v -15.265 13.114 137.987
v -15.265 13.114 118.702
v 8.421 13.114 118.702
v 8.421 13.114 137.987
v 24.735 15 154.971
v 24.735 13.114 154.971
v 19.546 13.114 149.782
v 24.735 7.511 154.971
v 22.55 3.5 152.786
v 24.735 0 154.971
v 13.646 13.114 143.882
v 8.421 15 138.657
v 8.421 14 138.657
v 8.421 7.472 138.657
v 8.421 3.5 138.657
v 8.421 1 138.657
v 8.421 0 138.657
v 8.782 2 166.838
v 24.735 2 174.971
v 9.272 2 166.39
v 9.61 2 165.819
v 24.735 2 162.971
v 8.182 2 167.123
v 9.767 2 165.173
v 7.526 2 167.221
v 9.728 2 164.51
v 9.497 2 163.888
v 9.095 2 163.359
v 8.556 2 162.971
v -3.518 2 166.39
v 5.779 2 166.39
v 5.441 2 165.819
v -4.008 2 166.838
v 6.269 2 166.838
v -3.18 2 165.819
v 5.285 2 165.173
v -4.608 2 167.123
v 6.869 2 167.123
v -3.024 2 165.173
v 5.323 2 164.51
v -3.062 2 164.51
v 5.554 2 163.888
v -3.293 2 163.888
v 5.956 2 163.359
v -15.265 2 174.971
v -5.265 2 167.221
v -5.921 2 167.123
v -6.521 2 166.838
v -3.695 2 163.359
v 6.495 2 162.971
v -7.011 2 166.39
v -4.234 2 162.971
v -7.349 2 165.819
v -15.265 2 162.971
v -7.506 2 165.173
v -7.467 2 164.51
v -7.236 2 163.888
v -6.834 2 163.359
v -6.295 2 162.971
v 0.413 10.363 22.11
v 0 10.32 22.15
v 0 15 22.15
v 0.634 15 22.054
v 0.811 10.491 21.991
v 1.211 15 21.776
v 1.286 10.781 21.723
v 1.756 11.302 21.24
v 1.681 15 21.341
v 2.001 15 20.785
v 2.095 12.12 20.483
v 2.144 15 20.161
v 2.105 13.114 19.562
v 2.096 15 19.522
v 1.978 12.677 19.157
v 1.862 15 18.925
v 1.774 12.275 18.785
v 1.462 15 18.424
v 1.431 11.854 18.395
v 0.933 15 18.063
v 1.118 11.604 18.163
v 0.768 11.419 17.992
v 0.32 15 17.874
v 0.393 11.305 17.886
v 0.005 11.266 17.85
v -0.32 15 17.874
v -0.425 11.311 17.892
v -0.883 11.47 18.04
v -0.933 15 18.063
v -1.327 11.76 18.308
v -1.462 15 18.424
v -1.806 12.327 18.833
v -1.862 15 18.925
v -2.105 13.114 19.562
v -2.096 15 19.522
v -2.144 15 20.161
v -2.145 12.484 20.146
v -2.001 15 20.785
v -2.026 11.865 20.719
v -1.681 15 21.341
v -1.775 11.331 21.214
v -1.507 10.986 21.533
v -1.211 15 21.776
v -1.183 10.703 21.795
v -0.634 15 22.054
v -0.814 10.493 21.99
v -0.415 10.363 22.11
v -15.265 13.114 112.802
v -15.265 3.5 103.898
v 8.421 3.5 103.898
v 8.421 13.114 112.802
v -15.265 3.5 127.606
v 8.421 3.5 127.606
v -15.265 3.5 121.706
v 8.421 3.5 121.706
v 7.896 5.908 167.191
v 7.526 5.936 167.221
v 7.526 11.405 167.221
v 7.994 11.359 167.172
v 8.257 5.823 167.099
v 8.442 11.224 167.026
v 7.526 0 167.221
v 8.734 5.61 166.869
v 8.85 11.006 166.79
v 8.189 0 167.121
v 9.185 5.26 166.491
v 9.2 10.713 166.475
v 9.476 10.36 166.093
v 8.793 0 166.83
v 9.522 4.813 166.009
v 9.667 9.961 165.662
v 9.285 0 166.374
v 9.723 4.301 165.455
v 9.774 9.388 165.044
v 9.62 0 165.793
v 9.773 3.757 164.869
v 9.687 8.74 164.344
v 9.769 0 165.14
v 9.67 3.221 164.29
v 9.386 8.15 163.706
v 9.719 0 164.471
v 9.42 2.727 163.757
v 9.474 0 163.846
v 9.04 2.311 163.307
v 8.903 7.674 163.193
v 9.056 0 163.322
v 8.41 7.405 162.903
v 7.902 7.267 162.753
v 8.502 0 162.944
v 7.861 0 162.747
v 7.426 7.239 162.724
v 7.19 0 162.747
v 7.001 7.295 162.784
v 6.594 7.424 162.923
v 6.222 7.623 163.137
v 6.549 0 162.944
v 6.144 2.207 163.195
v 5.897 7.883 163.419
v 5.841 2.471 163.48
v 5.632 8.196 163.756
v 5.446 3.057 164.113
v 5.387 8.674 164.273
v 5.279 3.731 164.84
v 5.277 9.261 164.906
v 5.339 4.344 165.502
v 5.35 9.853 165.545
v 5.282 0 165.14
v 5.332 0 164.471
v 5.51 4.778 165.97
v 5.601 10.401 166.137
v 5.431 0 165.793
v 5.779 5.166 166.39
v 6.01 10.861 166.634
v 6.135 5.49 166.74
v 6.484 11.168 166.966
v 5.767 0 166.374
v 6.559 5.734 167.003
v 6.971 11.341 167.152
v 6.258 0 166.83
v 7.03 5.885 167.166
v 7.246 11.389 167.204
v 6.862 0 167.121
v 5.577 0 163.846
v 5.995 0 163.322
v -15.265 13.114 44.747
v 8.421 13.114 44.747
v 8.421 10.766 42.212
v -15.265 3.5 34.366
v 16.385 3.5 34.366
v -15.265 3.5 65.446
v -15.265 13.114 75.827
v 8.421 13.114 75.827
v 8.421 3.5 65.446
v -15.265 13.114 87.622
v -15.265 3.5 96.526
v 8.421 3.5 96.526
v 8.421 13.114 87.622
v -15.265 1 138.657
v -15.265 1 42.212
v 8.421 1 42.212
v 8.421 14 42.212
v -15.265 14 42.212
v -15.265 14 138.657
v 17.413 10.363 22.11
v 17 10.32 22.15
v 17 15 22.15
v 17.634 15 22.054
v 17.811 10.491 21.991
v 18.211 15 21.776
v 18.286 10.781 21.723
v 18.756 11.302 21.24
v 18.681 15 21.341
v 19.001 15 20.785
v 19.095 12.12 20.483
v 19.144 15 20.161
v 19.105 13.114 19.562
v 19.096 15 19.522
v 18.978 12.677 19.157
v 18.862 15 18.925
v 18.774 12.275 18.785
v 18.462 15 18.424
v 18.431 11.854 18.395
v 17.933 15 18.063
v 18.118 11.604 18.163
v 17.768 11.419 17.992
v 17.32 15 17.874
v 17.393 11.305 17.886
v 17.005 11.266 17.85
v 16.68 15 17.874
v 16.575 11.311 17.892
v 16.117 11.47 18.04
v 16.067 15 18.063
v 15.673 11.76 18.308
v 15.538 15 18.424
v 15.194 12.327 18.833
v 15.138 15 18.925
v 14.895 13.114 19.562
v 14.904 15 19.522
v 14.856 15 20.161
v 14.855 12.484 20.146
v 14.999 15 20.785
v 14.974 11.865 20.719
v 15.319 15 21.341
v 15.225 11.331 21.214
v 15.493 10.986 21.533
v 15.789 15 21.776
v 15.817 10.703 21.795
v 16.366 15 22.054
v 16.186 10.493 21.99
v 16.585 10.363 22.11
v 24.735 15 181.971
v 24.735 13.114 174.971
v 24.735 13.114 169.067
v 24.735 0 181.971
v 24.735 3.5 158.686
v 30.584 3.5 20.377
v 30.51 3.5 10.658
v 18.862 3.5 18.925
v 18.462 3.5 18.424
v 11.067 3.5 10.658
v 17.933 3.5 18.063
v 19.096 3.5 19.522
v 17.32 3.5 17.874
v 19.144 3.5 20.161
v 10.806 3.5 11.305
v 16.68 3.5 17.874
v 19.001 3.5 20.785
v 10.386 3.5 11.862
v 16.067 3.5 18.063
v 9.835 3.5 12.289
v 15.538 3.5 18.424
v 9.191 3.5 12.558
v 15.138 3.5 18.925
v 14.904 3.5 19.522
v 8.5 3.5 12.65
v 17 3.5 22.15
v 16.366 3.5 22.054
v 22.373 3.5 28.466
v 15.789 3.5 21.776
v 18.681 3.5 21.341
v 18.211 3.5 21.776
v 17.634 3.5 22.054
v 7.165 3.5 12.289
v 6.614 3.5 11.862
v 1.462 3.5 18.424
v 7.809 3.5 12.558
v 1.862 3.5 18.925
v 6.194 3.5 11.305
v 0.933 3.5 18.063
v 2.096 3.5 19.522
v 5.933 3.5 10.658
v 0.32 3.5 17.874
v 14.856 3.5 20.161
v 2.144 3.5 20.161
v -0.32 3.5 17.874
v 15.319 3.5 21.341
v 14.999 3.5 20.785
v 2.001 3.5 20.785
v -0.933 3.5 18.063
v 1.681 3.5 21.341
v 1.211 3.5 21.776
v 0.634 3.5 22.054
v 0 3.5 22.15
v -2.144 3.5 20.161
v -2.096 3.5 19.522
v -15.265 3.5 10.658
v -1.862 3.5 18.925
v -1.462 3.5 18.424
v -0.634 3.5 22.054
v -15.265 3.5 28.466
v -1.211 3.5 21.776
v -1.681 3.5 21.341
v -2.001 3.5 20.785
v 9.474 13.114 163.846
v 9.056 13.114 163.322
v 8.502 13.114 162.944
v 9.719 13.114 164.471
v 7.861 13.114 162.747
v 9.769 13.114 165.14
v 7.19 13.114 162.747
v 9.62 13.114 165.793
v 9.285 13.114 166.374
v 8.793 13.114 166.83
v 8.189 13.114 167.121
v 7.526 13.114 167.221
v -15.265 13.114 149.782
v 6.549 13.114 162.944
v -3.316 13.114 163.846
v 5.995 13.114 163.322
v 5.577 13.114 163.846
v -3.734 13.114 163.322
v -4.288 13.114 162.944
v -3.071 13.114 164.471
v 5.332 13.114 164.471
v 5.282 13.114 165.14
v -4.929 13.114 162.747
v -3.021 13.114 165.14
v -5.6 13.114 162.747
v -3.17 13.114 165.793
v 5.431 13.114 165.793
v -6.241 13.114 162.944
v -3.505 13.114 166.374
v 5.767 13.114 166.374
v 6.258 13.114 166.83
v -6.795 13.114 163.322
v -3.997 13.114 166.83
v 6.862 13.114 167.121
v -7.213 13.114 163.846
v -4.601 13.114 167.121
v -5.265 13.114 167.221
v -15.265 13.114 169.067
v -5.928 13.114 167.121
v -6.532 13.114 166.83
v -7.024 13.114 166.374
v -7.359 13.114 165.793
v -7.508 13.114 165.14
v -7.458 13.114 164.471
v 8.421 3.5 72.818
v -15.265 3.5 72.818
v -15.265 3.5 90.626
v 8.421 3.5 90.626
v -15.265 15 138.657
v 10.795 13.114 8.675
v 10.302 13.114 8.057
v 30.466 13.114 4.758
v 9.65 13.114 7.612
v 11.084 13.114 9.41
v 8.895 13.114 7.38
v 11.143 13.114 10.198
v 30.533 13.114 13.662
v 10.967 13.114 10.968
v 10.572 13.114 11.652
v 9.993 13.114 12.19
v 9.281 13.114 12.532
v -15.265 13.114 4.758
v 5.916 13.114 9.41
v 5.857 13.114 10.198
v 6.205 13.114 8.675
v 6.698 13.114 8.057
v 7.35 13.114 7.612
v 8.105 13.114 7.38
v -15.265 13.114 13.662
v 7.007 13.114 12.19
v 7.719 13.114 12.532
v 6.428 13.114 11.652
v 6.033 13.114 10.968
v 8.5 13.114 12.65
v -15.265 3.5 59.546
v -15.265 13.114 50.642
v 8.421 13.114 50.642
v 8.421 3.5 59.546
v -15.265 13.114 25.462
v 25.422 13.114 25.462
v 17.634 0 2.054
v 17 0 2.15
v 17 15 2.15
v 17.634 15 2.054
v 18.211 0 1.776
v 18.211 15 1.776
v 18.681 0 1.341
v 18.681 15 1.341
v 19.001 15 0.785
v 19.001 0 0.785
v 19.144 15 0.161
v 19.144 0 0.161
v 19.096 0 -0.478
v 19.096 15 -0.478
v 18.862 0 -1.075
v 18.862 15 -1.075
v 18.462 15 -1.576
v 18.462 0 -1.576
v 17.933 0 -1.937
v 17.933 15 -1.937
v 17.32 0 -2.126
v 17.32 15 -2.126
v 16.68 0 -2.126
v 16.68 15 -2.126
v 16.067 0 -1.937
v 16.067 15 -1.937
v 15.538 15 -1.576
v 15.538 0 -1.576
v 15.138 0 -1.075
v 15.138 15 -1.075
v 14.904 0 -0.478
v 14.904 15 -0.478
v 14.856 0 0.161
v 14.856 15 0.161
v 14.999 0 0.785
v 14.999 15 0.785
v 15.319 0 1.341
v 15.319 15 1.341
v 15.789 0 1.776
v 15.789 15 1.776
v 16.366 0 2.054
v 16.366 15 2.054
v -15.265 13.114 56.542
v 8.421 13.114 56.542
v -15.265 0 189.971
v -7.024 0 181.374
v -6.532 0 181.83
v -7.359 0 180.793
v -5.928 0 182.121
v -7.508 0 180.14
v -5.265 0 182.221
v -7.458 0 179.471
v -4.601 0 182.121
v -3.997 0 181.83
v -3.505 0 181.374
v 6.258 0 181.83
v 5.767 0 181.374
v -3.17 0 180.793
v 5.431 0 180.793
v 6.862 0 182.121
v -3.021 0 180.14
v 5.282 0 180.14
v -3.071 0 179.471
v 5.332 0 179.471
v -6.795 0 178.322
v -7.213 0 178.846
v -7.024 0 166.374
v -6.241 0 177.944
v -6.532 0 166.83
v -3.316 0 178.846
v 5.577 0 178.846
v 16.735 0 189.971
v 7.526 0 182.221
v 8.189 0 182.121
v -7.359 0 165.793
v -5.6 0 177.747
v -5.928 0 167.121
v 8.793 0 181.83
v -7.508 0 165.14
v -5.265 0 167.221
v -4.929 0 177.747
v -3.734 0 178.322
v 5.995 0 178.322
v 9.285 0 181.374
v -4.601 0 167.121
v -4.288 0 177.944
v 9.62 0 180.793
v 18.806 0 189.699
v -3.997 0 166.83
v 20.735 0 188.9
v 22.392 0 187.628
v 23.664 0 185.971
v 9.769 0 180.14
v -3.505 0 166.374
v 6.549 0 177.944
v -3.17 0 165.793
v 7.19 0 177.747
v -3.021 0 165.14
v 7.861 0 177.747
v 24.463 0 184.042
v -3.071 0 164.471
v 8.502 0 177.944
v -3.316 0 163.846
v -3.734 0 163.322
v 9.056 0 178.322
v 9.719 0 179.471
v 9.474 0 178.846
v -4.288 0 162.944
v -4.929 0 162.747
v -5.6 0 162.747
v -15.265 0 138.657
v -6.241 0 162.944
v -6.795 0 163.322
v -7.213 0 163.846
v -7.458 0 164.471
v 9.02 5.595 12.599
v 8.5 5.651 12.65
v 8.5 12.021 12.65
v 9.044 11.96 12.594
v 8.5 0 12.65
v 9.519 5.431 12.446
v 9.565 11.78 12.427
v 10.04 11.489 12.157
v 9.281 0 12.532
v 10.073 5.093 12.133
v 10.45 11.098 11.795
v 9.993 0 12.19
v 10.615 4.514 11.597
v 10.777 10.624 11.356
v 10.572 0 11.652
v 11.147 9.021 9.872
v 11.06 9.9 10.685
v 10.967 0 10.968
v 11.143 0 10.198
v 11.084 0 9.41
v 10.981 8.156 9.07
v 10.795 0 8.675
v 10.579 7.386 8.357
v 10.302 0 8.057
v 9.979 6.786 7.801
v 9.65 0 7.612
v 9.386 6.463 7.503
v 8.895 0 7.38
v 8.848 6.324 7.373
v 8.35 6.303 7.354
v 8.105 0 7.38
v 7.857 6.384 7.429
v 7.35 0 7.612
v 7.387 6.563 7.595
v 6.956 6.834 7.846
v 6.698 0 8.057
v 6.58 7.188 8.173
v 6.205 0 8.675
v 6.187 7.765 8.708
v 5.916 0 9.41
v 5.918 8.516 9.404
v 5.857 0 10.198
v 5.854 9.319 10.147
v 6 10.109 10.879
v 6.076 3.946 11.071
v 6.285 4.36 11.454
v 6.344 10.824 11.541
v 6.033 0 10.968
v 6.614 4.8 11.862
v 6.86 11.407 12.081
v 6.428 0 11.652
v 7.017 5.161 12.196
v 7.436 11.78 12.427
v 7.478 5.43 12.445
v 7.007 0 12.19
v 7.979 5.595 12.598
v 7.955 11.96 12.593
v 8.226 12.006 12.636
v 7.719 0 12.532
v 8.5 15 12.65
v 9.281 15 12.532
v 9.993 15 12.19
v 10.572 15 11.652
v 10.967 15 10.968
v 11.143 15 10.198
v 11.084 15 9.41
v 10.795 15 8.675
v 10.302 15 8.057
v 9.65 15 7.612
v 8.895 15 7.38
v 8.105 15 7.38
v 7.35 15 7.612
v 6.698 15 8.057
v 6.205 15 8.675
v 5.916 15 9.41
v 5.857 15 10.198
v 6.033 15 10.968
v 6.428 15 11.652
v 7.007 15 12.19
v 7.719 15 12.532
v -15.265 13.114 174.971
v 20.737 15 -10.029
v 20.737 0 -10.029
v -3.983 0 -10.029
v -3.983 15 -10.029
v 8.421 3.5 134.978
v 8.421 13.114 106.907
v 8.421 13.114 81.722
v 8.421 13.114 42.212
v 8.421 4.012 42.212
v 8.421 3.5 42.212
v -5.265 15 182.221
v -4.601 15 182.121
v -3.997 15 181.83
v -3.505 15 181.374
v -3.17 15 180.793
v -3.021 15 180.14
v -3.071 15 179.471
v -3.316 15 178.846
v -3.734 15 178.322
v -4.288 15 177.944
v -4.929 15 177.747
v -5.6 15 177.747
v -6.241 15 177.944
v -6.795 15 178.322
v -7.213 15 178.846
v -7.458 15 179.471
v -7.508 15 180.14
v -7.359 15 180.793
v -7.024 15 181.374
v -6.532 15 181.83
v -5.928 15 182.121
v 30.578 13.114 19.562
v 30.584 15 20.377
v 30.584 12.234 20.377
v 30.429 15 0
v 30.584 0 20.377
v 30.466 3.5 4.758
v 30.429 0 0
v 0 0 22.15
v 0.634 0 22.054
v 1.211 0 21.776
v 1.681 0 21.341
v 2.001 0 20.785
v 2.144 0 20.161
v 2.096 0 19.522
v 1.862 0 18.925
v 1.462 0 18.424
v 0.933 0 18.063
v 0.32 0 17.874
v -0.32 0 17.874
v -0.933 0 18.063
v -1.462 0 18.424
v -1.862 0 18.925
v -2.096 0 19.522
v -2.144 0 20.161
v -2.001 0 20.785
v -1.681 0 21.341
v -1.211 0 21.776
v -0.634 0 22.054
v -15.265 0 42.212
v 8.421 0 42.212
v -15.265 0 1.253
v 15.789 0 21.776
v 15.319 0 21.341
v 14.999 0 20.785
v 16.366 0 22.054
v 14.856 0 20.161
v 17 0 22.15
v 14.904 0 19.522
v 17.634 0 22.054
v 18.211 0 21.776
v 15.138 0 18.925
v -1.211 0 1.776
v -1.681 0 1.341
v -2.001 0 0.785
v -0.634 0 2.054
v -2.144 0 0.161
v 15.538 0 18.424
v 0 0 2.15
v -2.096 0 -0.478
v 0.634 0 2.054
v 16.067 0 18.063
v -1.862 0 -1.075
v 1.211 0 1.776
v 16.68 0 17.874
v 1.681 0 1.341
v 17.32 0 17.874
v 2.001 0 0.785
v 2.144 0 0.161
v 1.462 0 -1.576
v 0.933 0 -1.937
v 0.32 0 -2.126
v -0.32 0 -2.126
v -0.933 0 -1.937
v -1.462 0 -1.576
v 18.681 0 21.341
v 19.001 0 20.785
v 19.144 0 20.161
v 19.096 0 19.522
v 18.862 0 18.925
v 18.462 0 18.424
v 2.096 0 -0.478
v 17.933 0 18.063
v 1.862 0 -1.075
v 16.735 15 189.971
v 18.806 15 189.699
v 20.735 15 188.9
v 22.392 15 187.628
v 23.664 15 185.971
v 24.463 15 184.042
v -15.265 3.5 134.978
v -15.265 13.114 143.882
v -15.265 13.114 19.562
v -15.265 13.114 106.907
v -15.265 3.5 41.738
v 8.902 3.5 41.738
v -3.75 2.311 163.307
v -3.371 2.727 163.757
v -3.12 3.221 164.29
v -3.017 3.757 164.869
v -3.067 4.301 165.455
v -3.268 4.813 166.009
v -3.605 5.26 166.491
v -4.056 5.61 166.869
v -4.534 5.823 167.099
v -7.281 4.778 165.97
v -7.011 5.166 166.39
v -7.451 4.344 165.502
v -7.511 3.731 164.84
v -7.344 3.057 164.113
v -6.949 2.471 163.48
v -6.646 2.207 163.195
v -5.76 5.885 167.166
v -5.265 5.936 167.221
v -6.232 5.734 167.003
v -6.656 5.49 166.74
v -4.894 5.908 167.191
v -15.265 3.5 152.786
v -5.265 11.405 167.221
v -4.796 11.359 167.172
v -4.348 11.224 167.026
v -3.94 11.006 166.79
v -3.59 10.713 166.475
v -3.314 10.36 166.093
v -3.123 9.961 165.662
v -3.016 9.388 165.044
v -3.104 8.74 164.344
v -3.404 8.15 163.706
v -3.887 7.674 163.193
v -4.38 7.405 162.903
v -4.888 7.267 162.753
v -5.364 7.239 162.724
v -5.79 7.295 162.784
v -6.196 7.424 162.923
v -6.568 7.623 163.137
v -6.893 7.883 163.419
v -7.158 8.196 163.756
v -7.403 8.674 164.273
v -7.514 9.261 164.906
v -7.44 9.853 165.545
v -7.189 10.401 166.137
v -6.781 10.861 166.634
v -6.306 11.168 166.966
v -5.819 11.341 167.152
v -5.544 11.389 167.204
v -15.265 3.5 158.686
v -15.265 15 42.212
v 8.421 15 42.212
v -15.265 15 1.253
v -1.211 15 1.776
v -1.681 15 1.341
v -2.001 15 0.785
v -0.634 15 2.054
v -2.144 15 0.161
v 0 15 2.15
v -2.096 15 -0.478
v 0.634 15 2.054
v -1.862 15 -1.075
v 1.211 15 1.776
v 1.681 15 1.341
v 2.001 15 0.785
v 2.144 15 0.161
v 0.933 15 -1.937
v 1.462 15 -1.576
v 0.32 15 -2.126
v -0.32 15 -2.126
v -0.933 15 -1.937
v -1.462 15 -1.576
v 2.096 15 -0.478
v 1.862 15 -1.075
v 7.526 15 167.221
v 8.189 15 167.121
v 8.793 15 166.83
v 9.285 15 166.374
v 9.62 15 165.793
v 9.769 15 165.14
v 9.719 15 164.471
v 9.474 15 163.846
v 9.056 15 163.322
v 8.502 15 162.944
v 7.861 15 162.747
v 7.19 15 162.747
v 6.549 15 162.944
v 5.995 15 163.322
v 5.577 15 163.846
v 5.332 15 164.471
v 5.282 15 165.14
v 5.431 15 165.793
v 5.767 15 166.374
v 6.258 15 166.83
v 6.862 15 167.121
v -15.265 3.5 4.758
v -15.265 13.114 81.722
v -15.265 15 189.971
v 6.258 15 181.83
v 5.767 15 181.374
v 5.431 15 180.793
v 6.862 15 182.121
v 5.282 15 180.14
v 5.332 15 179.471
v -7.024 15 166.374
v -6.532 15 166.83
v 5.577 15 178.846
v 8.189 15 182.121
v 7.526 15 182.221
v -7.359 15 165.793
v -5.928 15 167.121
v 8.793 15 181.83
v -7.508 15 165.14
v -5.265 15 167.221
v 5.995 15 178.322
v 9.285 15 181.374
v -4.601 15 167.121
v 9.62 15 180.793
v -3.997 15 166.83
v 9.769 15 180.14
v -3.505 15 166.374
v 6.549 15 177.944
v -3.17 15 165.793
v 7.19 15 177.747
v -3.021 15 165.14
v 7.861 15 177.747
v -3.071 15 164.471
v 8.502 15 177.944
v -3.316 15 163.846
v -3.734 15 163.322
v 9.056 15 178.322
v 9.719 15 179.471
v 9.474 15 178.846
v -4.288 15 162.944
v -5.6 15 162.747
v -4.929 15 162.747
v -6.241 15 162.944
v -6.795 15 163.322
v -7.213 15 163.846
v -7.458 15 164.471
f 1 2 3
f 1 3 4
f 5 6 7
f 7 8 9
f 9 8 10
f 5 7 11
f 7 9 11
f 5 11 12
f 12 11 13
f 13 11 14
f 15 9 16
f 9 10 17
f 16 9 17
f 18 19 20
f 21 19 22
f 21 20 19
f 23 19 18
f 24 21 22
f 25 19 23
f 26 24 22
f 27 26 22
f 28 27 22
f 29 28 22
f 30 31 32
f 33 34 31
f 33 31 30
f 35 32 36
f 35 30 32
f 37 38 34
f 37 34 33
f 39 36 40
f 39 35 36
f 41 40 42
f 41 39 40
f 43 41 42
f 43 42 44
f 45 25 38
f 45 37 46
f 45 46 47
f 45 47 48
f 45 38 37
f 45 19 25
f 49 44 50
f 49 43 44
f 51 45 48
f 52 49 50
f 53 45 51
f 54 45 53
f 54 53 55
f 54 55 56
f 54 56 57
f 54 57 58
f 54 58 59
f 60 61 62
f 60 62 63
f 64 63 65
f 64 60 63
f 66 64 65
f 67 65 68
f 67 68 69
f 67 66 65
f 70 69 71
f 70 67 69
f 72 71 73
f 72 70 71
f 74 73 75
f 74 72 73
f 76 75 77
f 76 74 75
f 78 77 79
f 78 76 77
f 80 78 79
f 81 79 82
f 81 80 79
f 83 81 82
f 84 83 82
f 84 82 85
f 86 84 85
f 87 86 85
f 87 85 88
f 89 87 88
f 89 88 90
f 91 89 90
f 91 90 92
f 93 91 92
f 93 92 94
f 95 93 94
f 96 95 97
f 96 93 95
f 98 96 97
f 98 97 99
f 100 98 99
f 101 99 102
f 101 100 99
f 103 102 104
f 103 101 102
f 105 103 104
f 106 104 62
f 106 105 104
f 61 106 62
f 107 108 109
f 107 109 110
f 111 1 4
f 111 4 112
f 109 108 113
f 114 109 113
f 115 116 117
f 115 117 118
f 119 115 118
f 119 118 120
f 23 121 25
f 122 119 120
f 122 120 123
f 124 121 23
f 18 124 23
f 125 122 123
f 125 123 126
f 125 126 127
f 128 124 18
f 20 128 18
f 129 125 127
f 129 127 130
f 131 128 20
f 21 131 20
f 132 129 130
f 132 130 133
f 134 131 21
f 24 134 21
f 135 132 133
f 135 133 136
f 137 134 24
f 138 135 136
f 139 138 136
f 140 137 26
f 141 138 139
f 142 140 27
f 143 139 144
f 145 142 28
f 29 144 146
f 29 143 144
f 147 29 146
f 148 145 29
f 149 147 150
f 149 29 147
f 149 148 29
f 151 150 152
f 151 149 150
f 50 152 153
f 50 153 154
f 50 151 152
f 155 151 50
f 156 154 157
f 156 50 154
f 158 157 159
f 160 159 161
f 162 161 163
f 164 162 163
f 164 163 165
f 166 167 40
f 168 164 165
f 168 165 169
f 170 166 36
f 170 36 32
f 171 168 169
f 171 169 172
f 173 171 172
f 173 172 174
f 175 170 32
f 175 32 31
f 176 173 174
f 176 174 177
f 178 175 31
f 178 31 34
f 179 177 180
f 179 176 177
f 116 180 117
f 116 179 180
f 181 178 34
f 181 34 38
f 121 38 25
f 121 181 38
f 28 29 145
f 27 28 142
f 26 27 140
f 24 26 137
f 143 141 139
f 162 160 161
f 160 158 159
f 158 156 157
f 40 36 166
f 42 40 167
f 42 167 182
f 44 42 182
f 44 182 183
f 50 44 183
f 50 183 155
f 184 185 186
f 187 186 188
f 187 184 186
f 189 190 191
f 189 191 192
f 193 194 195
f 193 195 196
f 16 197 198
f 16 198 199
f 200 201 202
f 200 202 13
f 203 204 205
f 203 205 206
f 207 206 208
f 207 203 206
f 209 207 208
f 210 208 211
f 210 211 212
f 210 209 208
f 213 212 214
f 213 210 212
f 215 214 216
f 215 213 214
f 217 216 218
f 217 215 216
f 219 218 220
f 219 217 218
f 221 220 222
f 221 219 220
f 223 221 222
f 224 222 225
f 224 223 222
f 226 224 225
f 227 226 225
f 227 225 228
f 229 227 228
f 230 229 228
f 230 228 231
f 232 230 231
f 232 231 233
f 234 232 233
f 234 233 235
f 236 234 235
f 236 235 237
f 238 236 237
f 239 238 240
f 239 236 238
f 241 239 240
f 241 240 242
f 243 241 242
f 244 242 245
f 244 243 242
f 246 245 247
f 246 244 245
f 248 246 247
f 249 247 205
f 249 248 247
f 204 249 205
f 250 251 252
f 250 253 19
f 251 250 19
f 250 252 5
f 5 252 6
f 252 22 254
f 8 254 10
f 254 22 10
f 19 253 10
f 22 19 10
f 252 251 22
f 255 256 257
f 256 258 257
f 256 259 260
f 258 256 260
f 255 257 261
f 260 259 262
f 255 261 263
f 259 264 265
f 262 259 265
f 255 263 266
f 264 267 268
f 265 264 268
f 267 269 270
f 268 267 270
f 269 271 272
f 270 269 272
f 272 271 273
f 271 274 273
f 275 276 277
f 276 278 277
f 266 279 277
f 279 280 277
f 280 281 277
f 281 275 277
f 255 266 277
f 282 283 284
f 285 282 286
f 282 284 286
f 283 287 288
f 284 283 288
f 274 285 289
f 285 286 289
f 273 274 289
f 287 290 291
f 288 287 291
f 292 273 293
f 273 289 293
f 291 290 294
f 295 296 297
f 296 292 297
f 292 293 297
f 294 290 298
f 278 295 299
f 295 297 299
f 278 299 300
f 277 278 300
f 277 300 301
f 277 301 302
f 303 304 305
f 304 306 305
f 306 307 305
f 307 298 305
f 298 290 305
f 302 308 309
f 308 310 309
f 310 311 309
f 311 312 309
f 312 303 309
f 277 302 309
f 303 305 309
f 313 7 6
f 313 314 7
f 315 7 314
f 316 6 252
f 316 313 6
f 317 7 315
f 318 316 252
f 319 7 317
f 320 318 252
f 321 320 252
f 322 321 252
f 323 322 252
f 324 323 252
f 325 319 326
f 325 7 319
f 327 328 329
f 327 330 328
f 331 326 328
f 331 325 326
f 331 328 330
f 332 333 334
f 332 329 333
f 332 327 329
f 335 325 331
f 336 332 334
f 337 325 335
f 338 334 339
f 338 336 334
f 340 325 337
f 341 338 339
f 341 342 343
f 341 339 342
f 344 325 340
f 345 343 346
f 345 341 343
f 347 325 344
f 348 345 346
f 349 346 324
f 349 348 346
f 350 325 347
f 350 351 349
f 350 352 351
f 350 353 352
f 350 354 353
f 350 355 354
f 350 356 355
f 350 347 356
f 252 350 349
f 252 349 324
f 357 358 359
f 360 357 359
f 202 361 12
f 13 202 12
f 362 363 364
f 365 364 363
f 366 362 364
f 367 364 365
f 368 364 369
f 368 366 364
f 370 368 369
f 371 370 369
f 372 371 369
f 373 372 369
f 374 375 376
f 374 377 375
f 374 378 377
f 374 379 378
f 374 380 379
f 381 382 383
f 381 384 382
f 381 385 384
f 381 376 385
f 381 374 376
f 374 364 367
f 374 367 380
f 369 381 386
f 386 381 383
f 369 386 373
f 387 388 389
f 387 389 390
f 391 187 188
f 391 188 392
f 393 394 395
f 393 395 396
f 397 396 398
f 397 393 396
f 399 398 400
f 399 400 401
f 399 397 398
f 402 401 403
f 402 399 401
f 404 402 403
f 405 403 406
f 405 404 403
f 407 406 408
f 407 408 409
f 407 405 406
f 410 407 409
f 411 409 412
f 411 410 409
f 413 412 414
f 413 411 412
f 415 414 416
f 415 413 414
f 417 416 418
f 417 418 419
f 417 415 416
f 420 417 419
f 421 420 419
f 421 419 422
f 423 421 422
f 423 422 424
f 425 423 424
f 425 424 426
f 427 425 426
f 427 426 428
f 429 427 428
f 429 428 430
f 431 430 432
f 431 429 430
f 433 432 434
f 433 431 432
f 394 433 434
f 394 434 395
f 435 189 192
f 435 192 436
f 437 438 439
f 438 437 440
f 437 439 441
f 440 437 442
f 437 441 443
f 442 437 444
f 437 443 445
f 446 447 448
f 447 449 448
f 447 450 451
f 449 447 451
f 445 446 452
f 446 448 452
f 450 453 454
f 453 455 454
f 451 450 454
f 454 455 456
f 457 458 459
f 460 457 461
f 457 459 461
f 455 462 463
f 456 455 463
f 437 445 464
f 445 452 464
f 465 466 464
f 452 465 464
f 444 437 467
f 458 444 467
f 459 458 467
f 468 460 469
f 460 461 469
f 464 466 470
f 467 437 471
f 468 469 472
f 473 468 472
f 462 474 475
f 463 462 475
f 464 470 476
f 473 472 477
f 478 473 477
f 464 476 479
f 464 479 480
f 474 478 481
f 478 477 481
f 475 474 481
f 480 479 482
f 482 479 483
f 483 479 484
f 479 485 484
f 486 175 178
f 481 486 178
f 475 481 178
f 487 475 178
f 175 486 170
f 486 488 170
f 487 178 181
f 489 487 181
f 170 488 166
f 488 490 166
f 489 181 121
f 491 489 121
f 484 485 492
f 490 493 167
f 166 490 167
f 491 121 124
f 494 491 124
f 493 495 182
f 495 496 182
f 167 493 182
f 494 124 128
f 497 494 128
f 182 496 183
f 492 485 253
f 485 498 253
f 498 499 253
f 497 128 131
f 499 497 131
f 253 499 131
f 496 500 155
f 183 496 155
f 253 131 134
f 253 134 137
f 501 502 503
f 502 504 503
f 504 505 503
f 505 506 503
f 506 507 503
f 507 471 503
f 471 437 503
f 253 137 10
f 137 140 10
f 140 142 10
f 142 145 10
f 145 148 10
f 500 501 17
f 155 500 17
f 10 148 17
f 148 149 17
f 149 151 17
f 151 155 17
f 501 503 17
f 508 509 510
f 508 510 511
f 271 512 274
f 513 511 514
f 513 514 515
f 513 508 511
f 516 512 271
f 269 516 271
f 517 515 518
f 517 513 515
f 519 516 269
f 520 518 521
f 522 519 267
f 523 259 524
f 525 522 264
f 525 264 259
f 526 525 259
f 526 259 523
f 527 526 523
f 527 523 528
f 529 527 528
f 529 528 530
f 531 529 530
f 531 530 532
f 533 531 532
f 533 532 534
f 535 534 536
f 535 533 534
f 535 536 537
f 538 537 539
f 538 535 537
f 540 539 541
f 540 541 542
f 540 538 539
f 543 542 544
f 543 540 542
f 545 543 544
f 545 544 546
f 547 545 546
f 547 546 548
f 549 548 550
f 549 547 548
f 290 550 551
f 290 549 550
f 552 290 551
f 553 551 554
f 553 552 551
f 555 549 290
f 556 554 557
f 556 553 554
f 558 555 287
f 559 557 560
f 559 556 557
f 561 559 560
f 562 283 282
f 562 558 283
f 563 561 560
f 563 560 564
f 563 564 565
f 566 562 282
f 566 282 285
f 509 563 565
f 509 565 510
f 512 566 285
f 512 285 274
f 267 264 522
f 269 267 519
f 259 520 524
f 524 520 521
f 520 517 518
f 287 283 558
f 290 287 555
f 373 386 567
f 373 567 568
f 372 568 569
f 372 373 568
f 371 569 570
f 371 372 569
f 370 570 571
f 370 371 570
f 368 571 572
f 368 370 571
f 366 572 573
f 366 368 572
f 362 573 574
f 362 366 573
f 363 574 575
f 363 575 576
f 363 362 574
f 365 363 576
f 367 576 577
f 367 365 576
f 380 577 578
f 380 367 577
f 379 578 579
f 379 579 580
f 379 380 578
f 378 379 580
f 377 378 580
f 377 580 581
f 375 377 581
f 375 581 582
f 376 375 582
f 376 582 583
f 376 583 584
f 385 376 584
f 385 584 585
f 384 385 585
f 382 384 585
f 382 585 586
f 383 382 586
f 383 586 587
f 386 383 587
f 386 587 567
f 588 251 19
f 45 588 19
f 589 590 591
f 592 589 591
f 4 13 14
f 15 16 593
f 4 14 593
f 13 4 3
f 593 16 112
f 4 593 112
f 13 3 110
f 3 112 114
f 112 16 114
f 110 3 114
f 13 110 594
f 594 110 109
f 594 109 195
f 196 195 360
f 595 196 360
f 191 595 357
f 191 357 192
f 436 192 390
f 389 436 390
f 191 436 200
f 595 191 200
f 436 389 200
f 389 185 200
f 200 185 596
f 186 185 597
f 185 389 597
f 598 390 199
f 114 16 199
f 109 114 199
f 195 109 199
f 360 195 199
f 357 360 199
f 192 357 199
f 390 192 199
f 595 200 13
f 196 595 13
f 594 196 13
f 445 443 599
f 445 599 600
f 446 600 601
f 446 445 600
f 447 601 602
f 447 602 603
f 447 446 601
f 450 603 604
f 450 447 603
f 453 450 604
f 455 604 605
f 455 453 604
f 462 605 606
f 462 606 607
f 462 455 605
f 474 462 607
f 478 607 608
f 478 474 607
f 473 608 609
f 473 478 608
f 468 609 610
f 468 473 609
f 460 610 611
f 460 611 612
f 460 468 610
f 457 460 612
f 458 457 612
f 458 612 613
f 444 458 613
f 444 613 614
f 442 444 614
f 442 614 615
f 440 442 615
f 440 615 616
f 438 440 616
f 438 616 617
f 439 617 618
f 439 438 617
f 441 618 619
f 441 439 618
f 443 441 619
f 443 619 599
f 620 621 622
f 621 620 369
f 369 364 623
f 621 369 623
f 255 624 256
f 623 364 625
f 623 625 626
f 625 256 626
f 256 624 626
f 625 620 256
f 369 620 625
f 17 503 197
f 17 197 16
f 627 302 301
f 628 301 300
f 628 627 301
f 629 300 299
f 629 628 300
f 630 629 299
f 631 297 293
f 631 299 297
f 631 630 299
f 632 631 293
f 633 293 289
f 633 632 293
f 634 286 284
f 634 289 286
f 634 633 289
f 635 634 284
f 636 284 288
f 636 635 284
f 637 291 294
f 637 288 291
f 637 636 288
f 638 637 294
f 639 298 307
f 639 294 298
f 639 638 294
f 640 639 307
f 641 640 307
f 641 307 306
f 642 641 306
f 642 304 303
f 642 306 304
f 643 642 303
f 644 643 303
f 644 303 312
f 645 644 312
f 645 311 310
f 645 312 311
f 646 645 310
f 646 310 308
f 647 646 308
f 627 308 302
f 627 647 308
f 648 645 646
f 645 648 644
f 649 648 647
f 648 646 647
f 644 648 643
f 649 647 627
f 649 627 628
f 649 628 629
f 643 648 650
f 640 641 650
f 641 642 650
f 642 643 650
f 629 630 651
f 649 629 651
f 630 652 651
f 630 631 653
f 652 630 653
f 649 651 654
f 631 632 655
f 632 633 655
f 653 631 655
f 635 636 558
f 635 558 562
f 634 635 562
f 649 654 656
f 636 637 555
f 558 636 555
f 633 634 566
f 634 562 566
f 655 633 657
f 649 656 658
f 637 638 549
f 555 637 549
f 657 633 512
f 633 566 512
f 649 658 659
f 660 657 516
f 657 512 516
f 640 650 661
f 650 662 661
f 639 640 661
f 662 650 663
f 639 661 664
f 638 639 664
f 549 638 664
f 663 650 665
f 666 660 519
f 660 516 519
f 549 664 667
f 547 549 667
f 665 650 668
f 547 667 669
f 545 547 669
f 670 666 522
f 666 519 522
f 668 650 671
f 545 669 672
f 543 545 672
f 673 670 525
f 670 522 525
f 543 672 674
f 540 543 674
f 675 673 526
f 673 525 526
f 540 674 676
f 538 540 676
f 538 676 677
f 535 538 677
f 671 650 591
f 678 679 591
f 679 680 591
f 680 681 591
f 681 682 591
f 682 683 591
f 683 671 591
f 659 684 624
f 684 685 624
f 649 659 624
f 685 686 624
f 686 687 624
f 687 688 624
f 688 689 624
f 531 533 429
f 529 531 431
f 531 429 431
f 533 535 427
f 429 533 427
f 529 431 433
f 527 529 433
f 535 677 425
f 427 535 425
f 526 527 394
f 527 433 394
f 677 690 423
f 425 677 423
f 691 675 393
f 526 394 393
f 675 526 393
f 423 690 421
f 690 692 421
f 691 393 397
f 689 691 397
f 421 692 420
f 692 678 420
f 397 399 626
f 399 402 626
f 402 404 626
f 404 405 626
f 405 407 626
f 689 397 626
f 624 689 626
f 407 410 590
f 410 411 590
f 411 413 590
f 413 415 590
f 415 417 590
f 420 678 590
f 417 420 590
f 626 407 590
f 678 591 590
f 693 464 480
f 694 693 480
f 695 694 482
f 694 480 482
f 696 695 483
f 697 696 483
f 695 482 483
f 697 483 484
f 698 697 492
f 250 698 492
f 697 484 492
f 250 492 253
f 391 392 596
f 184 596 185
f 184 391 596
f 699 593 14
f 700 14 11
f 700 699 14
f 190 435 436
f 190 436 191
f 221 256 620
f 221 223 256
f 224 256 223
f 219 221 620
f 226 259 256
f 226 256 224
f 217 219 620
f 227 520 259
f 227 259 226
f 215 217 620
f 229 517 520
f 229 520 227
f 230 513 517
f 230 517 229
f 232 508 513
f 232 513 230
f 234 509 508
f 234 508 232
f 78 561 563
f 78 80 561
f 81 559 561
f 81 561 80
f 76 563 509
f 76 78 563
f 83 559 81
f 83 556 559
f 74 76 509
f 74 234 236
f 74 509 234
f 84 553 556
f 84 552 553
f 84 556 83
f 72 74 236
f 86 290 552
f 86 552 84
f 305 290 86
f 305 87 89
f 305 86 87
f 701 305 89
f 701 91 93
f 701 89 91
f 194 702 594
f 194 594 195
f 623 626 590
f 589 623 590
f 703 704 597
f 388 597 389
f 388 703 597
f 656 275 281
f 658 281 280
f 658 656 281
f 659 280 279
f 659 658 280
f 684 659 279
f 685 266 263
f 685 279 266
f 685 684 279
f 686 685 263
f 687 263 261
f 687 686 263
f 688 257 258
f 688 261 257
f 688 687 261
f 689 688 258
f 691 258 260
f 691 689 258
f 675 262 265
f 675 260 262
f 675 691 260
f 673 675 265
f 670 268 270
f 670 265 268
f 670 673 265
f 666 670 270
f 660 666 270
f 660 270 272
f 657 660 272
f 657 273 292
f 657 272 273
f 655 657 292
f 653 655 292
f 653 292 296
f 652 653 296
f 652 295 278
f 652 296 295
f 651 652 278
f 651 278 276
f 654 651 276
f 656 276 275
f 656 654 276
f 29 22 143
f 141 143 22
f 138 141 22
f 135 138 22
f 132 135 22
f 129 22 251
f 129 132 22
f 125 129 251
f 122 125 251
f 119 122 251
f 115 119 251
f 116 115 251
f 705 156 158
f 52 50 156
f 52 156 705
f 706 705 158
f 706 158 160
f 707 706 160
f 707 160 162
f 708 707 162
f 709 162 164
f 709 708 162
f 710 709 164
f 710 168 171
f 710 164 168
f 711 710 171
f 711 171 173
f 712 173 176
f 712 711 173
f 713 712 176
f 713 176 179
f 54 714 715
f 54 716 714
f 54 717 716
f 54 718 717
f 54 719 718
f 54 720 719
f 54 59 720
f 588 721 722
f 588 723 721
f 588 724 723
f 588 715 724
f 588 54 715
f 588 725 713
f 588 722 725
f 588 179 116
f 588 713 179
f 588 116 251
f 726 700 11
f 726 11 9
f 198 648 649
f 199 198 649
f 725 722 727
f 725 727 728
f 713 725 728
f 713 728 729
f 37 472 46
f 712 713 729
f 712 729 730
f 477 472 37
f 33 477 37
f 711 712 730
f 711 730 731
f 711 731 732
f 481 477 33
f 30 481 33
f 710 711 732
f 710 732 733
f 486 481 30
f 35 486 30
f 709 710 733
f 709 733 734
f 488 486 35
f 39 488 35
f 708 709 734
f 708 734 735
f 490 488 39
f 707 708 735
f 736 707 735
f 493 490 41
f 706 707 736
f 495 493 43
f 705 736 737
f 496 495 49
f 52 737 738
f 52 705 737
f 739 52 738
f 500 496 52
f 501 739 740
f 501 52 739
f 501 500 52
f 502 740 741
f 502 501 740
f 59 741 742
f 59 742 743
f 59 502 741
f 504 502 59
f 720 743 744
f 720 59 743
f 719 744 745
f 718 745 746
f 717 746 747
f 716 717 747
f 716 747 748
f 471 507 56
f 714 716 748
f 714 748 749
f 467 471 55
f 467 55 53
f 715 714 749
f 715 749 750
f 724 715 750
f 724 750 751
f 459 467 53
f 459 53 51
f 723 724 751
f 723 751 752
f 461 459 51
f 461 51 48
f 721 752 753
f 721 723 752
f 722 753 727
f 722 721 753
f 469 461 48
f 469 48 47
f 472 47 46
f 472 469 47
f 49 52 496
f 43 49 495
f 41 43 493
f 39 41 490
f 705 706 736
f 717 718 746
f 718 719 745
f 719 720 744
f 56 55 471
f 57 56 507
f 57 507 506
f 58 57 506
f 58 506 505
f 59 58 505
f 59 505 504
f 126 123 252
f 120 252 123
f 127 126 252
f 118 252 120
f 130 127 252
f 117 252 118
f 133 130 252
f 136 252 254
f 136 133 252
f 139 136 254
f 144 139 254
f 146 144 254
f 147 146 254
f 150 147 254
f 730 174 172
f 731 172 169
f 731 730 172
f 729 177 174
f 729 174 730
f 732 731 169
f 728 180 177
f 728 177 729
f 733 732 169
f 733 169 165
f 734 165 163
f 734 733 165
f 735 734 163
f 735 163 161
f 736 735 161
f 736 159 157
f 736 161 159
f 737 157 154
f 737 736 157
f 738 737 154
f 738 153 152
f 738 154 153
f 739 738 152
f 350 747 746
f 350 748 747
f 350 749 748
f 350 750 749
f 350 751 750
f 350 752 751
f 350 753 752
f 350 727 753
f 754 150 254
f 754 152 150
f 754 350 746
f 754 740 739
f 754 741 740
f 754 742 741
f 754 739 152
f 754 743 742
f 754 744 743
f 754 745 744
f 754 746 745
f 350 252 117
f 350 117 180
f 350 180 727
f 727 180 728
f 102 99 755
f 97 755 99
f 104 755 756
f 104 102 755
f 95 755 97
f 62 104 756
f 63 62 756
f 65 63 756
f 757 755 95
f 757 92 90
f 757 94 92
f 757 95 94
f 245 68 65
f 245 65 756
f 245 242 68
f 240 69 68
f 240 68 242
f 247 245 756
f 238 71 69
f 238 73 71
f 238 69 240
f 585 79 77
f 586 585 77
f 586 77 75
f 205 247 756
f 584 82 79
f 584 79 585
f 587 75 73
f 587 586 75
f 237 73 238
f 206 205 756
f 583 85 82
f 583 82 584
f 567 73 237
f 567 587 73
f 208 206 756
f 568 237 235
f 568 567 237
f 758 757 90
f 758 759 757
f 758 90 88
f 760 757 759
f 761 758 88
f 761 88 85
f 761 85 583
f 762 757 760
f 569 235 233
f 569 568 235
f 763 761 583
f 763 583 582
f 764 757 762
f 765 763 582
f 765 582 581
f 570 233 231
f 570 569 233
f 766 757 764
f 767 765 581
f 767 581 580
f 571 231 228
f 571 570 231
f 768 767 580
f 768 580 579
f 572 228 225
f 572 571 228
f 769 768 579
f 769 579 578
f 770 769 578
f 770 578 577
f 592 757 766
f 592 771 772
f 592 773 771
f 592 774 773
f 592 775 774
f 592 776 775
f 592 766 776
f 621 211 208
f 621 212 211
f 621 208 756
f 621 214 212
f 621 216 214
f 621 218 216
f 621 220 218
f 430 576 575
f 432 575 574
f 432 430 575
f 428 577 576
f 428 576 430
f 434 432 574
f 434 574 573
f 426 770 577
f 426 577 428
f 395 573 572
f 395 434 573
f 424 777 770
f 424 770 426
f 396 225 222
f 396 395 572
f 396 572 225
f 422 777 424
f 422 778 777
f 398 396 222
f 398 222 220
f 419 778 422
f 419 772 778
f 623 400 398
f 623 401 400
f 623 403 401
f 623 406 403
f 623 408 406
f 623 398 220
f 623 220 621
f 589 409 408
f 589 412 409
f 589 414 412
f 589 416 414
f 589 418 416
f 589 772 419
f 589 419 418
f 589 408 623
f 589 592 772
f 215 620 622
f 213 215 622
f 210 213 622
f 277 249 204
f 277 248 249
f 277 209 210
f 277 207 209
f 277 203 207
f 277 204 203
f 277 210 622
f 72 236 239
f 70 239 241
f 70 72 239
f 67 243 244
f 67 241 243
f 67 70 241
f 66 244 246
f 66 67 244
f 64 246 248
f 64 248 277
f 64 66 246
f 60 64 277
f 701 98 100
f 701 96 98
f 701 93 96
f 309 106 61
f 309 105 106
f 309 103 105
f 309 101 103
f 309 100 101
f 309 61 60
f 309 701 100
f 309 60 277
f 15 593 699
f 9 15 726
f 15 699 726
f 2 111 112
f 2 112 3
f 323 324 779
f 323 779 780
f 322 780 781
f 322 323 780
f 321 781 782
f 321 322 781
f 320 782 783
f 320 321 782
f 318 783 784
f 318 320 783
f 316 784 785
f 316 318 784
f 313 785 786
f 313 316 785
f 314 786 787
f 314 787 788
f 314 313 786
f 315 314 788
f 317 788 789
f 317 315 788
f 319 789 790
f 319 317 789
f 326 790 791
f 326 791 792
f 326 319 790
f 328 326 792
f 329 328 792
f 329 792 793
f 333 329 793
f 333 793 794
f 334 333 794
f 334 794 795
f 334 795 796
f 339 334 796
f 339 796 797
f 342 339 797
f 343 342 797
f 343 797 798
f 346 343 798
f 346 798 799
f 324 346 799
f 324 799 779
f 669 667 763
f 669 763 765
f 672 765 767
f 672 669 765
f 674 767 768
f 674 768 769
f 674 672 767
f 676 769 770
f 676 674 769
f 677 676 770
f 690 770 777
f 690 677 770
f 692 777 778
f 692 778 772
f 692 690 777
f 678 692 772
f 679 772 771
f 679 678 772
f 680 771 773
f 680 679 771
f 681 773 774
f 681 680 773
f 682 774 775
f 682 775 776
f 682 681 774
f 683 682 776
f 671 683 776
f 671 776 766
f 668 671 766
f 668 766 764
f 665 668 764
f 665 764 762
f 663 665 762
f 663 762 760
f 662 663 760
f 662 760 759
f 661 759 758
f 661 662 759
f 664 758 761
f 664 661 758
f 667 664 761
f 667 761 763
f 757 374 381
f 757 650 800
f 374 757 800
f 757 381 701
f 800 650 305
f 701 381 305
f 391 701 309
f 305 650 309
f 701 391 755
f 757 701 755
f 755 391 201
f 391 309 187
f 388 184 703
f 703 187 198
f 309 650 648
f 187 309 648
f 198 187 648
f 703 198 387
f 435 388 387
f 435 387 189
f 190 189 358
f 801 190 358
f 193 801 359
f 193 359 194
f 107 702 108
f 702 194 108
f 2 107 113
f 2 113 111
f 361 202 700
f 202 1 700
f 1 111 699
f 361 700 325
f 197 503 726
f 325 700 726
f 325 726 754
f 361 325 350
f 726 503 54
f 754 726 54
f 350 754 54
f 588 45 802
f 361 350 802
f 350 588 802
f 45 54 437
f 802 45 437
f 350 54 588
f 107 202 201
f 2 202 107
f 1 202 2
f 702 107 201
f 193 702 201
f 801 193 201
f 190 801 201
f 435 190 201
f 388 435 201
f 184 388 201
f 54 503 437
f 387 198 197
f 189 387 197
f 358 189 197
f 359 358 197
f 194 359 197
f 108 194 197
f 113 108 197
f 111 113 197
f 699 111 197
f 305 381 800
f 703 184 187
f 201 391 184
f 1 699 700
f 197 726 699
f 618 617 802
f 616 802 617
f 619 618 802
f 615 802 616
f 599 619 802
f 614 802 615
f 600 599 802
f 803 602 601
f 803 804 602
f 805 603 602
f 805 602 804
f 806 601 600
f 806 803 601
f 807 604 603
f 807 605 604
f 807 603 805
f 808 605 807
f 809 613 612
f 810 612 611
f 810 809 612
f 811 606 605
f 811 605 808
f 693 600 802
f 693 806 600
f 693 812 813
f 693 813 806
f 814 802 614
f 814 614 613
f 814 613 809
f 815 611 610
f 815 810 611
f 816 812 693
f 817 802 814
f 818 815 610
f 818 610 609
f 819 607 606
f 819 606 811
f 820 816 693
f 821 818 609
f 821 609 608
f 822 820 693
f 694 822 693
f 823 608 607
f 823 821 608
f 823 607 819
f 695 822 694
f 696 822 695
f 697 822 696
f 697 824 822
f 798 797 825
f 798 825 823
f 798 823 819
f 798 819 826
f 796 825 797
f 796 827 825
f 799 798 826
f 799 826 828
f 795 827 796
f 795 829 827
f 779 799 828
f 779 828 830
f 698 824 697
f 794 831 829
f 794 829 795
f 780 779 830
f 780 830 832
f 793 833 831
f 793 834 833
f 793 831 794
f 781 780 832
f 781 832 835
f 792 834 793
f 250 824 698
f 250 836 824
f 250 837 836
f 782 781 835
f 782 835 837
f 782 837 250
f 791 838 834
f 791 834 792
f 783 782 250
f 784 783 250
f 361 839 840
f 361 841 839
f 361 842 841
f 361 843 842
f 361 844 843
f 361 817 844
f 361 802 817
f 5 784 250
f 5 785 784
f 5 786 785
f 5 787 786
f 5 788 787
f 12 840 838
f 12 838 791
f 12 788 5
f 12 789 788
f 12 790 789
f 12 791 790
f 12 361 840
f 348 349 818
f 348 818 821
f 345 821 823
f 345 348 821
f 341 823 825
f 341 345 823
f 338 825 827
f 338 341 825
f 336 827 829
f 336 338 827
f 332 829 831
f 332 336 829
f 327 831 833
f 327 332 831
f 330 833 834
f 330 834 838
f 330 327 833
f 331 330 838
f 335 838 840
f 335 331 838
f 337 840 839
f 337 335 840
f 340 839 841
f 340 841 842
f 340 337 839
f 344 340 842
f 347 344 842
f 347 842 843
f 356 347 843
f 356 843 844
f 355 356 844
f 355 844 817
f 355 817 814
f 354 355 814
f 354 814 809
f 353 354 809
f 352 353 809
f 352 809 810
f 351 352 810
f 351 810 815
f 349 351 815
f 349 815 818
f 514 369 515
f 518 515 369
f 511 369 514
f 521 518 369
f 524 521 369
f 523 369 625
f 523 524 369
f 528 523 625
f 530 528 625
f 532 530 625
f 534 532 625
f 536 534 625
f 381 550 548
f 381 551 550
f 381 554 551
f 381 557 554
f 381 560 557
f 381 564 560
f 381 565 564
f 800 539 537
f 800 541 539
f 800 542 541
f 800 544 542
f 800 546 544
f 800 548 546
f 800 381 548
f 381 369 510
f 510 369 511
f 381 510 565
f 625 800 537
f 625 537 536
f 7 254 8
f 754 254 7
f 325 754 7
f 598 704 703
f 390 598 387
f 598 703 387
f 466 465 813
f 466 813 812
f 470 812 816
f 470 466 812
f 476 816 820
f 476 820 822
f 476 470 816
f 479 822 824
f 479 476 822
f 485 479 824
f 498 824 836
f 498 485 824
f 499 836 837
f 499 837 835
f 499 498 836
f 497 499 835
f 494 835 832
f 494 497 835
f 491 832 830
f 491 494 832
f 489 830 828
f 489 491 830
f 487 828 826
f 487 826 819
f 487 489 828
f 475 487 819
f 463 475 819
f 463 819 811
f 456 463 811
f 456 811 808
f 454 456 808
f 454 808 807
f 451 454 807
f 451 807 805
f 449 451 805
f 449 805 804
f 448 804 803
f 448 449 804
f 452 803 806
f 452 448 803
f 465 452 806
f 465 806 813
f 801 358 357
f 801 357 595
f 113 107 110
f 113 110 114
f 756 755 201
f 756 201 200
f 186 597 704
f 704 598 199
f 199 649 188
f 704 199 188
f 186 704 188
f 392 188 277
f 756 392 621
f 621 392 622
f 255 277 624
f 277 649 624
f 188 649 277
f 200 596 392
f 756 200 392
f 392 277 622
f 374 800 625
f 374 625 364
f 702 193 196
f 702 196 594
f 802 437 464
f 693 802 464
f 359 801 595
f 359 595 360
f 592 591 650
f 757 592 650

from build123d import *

# Parameters (mm, degrees)
SKETCH1_R           = 2.25
SKETCH1_R_2         = 2.65
SKETCH1_R_3         = 2.15
BOSS_EXTRUDE1_DEPTH = 15
CUT_EXTRUDE2_DEPTH  = 46
SKETCH3_W           = 23.685590182
SKETCH3_H           = 96.44516038
CUT_EXTRUDE4_DEPTH  = 1
SKETCH4_W           = 23.685590182
SKETCH4_H           = 96.44516038
CUT_EXTRUDE5_DEPTH  = 1


with BuildPart() as part:
    # Sketch1 → Boss-Extrude1 (new body)
    with BuildSketch(Plane(origin=(0, 0, 0), x_dir=(1, 0, 0), z_dir=(0, 1, 0))):
        with BuildLine():
            Line((-15.264606027, -1.25325428), (-15.264606027, -189.971404395))
            Line((-15.264606027, -189.971404395), (16.735393973, -189.971404395))
            ThreePointArc((16.735393973, -189.971404395), (22.392248222, -187.628258644), (24.735393973, -181.971404395))
            Line((24.735393973, -181.971404395), (24.735393973, -154.971404395))
            Line((24.735393973, -154.971404395), (8.420984155, -138.656994577))
            Line((8.420984155, -138.656994577), (8.420984155, -42.211834197))
            Line((8.420984155, -42.211834197), (30.584014254, -20.376885374))
            Line((30.584014254, -20.376885374), (30.429434292, 0))
            Line((30.429434292, 0), (20.736580617, 10.028595605))
            Line((20.736580617, 10.028595605), (-3.982756142, 10.028595605))
            Line((-3.982756142, 10.028595605), (-15.264606027, -1.25325428))
        make_face()
        with Locations(Location((-5.264606027, -179.971404395, 0), (0, 0, 270))):
            Circle(SKETCH1_R, mode=Mode.SUBTRACT)
        with Locations(Location((7.525634834, -179.971404395, 0), (0, 0, 270))):
            Circle(SKETCH1_R, mode=Mode.SUBTRACT)
        with Locations(Location((-5.264606027, -164.971404395, 0), (0, 0, 270))):
            Circle(SKETCH1_R, mode=Mode.SUBTRACT)
        with Locations(Location((7.525634834, -164.971404395, 0), (0, 0, 270))):
            Circle(SKETCH1_R, mode=Mode.SUBTRACT)
        with Locations(Location((8.5, -10, 0), (0, 0, 270))):
            Circle(SKETCH1_R_2, mode=Mode.SUBTRACT)
        with Locations(Location((0, 0, 0), (0, 0, 270))):
            Circle(SKETCH1_R_3, mode=Mode.SUBTRACT)
        with Locations(Location((17, 0, 0), (0, 0, 270))):
            Circle(SKETCH1_R_3, mode=Mode.SUBTRACT)
        with Locations(Location((0, -20, 0), (0, 0, 270))):
            Circle(SKETCH1_R_3, mode=Mode.SUBTRACT)
        with Locations(Location((17, -20, 0), (0, 0, 270))):
            Circle(SKETCH1_R_3, mode=Mode.SUBTRACT)
    extrude(amount=BOSS_EXTRUDE1_DEPTH)

    # Sketch2 → Cut-Extrude2 (cut)
    with BuildSketch(Plane.ZY.offset(15.264606027)):
        Polygon((174.971404395, 13.113981192), (174.971404395, 2), (162.971404395, 2), align=None)
        Polygon((149.78200197, 13.113981192), (169.066554165, 13.113981192), (158.686135815, 3.5), align=None)
        Polygon((4.75786812, 3.5), (4.75786812, 13.113981192), (13.66200197, 13.113981192), align=None)
        Polygon((143.88200197, 13.113981192), (152.786135815, 3.5), (143.88200197, 3.5), (134.97786812, 3.5), align=None)
        Polygon((112.80200197, 13.113981192), (121.706135815, 3.5), (112.80200197, 3.5), (103.89786812, 3.5), align=None)
        Polygon((81.72200197, 13.113981192), (90.626135815, 3.5), (81.72200197, 3.5), (72.81786812, 3.5), align=None)
        Polygon((50.64200197, 13.113981192), (59.546135815, 3.5), (50.64200197, 3.5), (41.73786812, 3.5), align=None)
        Polygon((19.56200197, 13.113981192), (28.466135815, 3.5), (19.56200197, 3.5), (10.65786812, 3.5), align=None)
        Polygon((137.986554165, 13.113981192), (127.606135815, 3.5), (118.70200197, 13.113981192), align=None)
        Polygon((106.906554165, 13.113981192), (96.526135815, 3.5), (87.62200197, 13.113981192), align=None)
        Polygon((75.826554165, 13.113981192), (65.446135815, 3.5), (56.54200197, 13.113981192), align=None)
        Polygon((44.746554165, 13.113981192), (34.366135815, 3.5), (25.46200197, 13.113981192), align=None)
    extrude(amount=-CUT_EXTRUDE2_DEPTH, mode=Mode.SUBTRACT)

    # Sketch3 → Cut-Extrude4 (cut)
    with BuildSketch(Plane.XZ):
        with Locations((-3.421810936, 90.434414387)):
            Rectangle(SKETCH3_W, SKETCH3_H)
    extrude(amount=-CUT_EXTRUDE4_DEPTH, mode=Mode.SUBTRACT)

    # Sketch4 → Cut-Extrude5 (cut)
    with BuildSketch(Plane(origin=(0, 15, 0), x_dir=(1, 0, 0), z_dir=(0, 1, 0))):
        with Locations((-3.421810936, -90.434414387)):
            Rectangle(SKETCH4_W, SKETCH4_H)
    extrude(amount=-CUT_EXTRUDE5_DEPTH, mode=Mode.SUBTRACT)


solid = part.part
